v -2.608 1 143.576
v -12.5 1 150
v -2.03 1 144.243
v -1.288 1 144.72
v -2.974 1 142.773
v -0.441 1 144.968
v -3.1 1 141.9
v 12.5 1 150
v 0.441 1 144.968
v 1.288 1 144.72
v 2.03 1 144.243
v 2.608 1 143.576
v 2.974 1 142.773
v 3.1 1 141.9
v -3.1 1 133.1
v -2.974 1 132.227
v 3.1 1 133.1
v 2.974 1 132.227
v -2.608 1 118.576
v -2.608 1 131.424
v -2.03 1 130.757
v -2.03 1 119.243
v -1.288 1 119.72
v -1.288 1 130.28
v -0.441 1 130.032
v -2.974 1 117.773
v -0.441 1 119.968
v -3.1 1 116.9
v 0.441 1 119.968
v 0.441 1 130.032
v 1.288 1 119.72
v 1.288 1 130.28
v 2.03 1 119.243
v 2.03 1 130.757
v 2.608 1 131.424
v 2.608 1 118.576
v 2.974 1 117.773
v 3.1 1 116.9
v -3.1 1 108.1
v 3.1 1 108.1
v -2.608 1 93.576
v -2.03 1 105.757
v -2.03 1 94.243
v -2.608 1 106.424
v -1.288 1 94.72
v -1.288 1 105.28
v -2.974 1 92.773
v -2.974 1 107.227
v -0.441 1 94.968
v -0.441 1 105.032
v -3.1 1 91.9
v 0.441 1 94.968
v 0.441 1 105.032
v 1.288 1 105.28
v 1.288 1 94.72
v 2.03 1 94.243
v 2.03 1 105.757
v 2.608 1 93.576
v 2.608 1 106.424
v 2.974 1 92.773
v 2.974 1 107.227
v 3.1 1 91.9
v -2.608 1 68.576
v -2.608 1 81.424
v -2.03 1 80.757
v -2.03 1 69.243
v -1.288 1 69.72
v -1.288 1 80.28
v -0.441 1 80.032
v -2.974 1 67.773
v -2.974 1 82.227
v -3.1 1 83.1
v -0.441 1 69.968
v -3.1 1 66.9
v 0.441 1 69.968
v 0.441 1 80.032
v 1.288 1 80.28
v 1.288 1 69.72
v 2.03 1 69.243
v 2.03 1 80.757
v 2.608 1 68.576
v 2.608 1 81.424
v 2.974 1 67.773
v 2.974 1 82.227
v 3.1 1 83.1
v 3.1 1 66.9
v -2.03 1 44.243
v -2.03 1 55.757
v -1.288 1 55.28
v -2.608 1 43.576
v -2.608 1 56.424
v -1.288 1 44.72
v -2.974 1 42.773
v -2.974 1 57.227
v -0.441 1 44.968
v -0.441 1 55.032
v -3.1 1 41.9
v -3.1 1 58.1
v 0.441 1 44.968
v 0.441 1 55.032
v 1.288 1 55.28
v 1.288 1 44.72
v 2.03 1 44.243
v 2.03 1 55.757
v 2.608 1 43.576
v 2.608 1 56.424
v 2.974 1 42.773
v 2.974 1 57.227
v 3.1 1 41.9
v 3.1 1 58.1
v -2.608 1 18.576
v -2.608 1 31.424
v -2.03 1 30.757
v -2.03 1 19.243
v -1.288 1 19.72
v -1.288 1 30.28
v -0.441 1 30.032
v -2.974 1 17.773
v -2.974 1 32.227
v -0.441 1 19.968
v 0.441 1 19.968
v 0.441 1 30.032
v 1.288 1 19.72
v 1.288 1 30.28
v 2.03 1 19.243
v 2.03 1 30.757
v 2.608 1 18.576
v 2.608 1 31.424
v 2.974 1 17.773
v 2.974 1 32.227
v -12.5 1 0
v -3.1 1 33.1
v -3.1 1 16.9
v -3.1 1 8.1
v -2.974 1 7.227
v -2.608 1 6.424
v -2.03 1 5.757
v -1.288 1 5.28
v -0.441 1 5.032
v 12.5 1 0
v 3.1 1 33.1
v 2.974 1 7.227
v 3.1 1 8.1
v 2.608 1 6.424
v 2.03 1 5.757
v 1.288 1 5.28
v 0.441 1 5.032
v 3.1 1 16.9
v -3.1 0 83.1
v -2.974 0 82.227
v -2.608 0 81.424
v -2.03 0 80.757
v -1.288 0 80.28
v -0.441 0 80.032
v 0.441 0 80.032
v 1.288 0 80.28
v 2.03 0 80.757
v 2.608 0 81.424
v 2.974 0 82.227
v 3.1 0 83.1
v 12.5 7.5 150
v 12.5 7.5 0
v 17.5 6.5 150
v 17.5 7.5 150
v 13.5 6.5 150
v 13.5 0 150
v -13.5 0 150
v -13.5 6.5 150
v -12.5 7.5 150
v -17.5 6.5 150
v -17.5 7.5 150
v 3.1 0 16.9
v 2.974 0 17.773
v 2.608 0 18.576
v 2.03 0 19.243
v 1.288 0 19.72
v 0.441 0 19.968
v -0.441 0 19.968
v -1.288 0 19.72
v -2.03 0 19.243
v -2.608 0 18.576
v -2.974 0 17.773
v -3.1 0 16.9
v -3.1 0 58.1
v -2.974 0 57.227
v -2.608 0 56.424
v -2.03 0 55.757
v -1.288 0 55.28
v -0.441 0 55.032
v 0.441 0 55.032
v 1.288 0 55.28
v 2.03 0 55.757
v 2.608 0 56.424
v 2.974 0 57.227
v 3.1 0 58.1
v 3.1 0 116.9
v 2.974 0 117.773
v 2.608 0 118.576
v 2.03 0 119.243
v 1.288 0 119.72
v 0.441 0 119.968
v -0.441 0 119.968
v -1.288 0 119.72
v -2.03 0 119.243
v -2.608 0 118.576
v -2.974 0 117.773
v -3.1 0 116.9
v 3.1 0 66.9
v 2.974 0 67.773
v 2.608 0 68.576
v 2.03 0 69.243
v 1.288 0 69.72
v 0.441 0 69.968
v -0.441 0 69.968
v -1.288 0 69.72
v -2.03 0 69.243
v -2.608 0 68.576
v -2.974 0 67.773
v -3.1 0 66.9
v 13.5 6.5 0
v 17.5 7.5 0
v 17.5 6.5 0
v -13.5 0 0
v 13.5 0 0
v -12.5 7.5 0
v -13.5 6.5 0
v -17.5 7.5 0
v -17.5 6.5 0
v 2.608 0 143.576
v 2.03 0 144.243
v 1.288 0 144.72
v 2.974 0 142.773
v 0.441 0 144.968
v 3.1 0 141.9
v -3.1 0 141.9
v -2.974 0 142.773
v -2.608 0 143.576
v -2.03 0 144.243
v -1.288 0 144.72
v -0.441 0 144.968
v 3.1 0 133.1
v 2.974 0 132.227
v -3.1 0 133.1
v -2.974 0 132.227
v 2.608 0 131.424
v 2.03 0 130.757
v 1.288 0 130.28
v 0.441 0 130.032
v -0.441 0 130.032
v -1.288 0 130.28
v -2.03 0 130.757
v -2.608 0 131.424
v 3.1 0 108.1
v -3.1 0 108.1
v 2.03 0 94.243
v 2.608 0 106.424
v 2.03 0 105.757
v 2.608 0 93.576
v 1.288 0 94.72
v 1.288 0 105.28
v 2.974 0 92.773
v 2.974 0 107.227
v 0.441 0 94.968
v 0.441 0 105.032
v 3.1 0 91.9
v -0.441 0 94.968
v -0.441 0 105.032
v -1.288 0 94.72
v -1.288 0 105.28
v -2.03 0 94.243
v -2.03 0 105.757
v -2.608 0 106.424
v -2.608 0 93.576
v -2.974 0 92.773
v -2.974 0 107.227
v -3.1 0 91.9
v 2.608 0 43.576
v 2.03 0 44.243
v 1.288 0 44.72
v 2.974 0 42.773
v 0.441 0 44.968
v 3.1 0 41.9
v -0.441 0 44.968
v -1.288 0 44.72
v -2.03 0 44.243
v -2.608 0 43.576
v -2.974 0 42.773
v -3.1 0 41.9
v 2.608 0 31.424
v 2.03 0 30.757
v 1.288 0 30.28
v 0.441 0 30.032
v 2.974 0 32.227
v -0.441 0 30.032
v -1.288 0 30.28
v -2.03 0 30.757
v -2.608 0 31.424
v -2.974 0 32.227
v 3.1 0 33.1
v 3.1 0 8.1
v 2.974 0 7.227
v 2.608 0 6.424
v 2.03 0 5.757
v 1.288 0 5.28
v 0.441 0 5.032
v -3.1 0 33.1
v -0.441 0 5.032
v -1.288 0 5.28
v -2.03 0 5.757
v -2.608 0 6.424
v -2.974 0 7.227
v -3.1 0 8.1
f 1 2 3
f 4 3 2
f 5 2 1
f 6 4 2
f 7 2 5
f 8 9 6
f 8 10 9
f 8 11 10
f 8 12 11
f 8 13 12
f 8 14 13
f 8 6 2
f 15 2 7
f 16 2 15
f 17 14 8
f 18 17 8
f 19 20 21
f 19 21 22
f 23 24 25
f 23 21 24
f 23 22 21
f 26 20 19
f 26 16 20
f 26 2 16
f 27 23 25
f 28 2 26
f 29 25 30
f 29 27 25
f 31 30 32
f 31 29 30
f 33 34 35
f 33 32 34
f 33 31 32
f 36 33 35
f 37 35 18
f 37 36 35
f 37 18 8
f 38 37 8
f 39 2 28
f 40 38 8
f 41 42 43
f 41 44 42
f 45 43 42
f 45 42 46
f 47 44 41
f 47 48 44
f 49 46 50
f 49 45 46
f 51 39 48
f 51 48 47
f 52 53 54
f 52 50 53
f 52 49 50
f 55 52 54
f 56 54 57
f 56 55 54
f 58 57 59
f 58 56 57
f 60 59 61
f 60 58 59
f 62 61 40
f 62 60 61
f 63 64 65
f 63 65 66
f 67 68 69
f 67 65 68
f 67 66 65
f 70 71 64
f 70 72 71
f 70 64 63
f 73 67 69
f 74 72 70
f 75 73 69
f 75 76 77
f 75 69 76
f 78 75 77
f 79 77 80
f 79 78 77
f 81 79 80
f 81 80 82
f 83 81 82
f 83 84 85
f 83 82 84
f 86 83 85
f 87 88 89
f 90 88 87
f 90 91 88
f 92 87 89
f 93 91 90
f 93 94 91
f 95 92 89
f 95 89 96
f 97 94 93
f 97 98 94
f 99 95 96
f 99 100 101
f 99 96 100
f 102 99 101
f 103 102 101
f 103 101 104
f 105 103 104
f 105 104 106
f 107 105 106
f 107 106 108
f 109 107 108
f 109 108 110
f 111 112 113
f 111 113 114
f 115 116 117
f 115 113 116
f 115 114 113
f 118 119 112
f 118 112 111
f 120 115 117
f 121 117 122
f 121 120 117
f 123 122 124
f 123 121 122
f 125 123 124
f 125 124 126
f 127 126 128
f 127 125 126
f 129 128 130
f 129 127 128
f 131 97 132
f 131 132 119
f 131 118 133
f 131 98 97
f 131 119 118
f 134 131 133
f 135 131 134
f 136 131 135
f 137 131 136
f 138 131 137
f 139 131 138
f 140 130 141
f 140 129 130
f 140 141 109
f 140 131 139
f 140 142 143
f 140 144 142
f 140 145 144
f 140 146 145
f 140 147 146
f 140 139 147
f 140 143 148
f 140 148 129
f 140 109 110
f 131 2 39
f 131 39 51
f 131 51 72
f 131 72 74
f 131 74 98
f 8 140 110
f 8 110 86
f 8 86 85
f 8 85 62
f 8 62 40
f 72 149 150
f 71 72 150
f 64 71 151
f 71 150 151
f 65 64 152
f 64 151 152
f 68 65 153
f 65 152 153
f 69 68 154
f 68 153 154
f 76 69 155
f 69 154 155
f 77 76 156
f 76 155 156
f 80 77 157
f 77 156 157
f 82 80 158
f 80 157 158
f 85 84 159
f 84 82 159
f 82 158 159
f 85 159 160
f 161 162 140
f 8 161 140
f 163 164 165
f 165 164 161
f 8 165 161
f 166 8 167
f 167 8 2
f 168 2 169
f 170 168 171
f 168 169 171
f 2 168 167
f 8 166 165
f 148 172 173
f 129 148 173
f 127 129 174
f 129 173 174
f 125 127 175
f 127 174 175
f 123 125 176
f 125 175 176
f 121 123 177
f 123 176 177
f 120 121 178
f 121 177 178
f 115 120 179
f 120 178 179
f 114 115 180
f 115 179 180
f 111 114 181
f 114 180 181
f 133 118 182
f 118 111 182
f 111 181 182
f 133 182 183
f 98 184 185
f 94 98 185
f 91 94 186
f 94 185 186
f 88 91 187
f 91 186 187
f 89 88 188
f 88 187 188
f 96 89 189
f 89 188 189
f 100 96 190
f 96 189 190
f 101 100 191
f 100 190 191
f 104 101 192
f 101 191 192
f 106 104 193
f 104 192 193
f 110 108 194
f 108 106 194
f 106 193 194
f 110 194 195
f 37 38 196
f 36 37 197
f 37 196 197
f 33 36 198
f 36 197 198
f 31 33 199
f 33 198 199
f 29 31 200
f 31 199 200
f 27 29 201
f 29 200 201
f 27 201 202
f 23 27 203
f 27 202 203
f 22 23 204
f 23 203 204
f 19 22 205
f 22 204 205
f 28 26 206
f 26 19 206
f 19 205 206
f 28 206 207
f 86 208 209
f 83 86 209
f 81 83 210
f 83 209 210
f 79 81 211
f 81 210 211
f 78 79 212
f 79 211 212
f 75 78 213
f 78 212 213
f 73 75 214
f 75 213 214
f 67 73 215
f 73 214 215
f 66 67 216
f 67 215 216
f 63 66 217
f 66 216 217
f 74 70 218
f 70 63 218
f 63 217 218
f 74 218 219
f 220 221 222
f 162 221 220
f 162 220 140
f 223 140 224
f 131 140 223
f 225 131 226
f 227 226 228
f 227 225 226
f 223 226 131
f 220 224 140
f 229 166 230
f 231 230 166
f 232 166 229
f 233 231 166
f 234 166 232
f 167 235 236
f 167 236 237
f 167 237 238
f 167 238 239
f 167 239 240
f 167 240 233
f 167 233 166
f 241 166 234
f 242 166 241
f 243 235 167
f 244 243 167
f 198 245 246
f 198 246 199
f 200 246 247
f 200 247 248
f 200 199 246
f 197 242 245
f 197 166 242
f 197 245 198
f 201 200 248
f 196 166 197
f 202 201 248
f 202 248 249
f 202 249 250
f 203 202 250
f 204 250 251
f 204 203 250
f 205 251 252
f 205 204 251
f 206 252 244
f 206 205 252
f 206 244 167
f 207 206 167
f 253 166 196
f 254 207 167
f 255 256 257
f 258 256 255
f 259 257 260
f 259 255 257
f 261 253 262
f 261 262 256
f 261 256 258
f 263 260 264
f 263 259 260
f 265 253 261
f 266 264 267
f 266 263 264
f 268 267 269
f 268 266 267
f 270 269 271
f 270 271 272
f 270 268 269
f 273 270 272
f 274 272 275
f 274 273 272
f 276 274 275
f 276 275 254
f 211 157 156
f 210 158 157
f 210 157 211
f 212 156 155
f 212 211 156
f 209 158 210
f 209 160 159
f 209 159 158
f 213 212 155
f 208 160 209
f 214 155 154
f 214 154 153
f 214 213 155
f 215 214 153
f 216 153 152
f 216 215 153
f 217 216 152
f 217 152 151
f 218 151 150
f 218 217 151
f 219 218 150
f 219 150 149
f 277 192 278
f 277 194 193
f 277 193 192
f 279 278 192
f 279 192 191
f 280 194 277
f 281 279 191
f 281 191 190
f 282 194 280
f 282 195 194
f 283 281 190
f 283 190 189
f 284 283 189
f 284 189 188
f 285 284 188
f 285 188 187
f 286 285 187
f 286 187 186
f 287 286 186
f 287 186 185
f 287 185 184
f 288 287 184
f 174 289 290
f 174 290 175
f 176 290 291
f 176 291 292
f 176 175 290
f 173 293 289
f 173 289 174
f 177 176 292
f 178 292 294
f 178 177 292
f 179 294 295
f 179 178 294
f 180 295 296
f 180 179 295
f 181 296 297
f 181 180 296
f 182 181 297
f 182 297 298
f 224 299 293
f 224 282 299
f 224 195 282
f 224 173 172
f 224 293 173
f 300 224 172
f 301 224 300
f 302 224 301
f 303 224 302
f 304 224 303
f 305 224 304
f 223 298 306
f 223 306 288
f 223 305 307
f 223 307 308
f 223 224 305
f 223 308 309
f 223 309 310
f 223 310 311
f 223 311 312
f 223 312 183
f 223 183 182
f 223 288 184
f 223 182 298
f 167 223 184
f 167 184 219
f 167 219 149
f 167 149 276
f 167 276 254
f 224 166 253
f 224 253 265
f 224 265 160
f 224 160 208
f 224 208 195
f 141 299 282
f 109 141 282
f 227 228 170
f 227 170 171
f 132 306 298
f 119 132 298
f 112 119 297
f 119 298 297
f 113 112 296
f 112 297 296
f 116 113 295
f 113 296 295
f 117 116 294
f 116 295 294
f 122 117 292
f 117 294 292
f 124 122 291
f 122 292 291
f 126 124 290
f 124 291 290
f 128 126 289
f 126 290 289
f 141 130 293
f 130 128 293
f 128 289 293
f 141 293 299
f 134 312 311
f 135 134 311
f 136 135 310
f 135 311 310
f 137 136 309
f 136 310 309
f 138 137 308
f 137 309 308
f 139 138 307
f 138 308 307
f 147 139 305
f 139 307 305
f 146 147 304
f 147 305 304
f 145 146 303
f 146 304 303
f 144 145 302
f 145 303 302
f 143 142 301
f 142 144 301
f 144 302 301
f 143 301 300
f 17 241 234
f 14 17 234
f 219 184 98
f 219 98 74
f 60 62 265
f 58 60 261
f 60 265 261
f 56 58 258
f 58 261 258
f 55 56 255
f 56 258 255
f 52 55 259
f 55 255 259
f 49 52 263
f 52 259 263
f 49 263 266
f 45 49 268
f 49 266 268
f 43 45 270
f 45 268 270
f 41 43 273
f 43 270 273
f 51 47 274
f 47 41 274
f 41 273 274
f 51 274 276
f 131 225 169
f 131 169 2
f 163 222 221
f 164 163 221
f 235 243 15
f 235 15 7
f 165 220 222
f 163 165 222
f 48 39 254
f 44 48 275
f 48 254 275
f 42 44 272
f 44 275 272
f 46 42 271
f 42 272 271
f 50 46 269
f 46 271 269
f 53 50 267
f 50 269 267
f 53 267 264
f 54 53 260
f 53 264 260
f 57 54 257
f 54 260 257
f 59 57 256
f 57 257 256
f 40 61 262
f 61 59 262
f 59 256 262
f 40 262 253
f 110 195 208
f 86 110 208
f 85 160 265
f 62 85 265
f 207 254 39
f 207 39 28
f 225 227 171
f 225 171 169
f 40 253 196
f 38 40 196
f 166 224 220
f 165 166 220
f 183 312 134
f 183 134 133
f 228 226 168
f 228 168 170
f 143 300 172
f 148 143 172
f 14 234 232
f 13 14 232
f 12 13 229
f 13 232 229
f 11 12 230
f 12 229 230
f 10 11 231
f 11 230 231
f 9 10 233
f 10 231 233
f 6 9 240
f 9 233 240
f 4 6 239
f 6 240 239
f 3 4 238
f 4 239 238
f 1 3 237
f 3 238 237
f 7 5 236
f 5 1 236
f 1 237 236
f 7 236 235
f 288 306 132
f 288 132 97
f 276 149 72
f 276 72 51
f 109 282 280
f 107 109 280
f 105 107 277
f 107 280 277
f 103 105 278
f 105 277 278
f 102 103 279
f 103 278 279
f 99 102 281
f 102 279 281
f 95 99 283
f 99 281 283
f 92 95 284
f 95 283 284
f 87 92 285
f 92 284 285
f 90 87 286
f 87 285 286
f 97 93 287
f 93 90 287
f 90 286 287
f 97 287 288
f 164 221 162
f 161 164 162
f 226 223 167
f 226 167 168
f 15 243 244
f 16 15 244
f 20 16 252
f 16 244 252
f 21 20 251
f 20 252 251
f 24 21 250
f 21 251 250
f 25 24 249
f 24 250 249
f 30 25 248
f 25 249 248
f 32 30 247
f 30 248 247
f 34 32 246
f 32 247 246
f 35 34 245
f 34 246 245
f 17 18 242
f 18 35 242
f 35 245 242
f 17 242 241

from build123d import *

# Parameters (mm, degrees)
BOSS_EXTRUDE1_DEPTH  = 150
CUT_EXTRUDE1_DEPTH   = 152.20350525
LPATTERN1_COUNT      = 6
LPATTERN1_PITCH      = 25
MIRROR2_COPY_1_DEPTH = 152.20350525
MIRROR2_COPY_2_DEPTH = 152.20350525
MIRROR2_COPY_3_DEPTH = 152.20350525
MIRROR2_COPY_4_DEPTH = 152.20350525
MIRROR2_COPY_5_DEPTH = 152.20350525


with BuildPart() as part:
    # Sketch1 → Boss-Extrude1 (new body)
    with BuildSketch(Plane.XY):
        Polygon((0, 0), (13.5, 0), (13.5, 6.5), (17.5, 6.5), (17.5, 7.5), (12.5, 7.5), (12.5, 1), (0, 1), align=None)
    boss_extrude1 = extrude(amount=BOSS_EXTRUDE1_DEPTH)

    # Sketch2 → Cut-Extrude1 (cut, through all)
    with BuildSketch(Plane(origin=(0, 0, 0), x_dir=(1, 0, 0), z_dir=(0, 1, 0))):
        with BuildLine():
            Line((3.1, -8.1), (3.1, -16.9))
            ThreePointArc((3.1, -16.9), (0, -20), (-3.1, -16.9))
            Line((-3.1, -16.9), (-3.1, -8.1))
            ThreePointArc((-3.1, -8.1), (0, -5), (3.1, -8.1))
        make_face()
    cut_extrude1 = extrude(amount=CUT_EXTRUDE1_DEPTH, mode=Mode.SUBTRACT)

    # LPattern1: Cut-Extrude1 ×6
    with Locations(*[(0, 0, i * LPATTERN1_PITCH) for i in range(1, LPATTERN1_COUNT)]):
        add(cut_extrude1, mode=Mode.SUBTRACT)

    # Mirror2: Boss-Extrude1, Cut-Extrude1 across plane
    add(boss_extrude1.mirror(Plane(origin=(0, 0, 0), x_dir=(0, 0, 1), z_dir=(1, 0, 0))))
    add(cut_extrude1.mirror(Plane(origin=(0, 0, 0), x_dir=(0, 0, 1), z_dir=(1, 0, 0))), mode=Mode.SUBTRACT)

    # Mirror2 copy 1 sketch → Mirror2 copy 1 (cut, through all)
    with BuildSketch(Plane(origin=(0, 0, 25), x_dir=(-1, 0, 0), z_dir=(0, 1, 0))):
        with BuildLine():
            Line((3.1, 8.1), (3.1, 16.9))
            ThreePointArc((3.1, 16.9), (0, 20), (-3.1, 16.9))
            Line((-3.1, 16.9), (-3.1, 8.1))
            ThreePointArc((-3.1, 8.1), (0, 5), (3.1, 8.1))
        make_face()
    extrude(amount=MIRROR2_COPY_1_DEPTH, mode=Mode.SUBTRACT)

    # Mirror2 copy 2 sketch → Mirror2 copy 2 (cut, through all)
    with BuildSketch(Plane(origin=(0, 0, 50), x_dir=(-1, 0, 0), z_dir=(0, 1, 0))):
        with BuildLine():
            Line((3.1, 8.1), (3.1, 16.9))
            ThreePointArc((3.1, 16.9), (0, 20), (-3.1, 16.9))
            Line((-3.1, 16.9), (-3.1, 8.1))
            ThreePointArc((-3.1, 8.1), (0, 5), (3.1, 8.1))
        make_face()
    extrude(amount=MIRROR2_COPY_2_DEPTH, mode=Mode.SUBTRACT)

    # Mirror2 copy 3 sketch → Mirror2 copy 3 (cut, through all)
    with BuildSketch(Plane(origin=(0, 0, 75), x_dir=(-1, 0, 0), z_dir=(0, 1, 0))):
        with BuildLine():
            Line((3.1, 8.1), (3.1, 16.9))
            ThreePointArc((3.1, 16.9), (0, 20), (-3.1, 16.9))
            Line((-3.1, 16.9), (-3.1, 8.1))
            ThreePointArc((-3.1, 8.1), (0, 5), (3.1, 8.1))
        make_face()
    extrude(amount=MIRROR2_COPY_3_DEPTH, mode=Mode.SUBTRACT)

    # Mirror2 copy 4 sketch → Mirror2 copy 4 (cut, through all)
    with BuildSketch(Plane(origin=(0, 0, 100), x_dir=(-1, 0, 0), z_dir=(0, 1, 0))):
        with BuildLine():
            Line((3.1, 8.1), (3.1, 16.9))
            ThreePointArc((3.1, 16.9), (0, 20), (-3.1, 16.9))
            Line((-3.1, 16.9), (-3.1, 8.1))
            ThreePointArc((-3.1, 8.1), (0, 5), (3.1, 8.1))
        make_face()
    extrude(amount=MIRROR2_COPY_4_DEPTH, mode=Mode.SUBTRACT)

    # Mirror2 copy 5 sketch → Mirror2 copy 5 (cut, through all)
    with BuildSketch(Plane(origin=(0, 0, 125), x_dir=(-1, 0, 0), z_dir=(0, 1, 0))):
        with BuildLine():
            Line((3.1, 8.1), (3.1, 16.9))
            ThreePointArc((3.1, 16.9), (0, 20), (-3.1, 16.9))
            Line((-3.1, 16.9), (-3.1, 8.1))
            ThreePointArc((-3.1, 8.1), (0, 5), (3.1, 8.1))
        make_face()
    extrude(amount=MIRROR2_COPY_5_DEPTH, mode=Mode.SUBTRACT)


solid = part.part
